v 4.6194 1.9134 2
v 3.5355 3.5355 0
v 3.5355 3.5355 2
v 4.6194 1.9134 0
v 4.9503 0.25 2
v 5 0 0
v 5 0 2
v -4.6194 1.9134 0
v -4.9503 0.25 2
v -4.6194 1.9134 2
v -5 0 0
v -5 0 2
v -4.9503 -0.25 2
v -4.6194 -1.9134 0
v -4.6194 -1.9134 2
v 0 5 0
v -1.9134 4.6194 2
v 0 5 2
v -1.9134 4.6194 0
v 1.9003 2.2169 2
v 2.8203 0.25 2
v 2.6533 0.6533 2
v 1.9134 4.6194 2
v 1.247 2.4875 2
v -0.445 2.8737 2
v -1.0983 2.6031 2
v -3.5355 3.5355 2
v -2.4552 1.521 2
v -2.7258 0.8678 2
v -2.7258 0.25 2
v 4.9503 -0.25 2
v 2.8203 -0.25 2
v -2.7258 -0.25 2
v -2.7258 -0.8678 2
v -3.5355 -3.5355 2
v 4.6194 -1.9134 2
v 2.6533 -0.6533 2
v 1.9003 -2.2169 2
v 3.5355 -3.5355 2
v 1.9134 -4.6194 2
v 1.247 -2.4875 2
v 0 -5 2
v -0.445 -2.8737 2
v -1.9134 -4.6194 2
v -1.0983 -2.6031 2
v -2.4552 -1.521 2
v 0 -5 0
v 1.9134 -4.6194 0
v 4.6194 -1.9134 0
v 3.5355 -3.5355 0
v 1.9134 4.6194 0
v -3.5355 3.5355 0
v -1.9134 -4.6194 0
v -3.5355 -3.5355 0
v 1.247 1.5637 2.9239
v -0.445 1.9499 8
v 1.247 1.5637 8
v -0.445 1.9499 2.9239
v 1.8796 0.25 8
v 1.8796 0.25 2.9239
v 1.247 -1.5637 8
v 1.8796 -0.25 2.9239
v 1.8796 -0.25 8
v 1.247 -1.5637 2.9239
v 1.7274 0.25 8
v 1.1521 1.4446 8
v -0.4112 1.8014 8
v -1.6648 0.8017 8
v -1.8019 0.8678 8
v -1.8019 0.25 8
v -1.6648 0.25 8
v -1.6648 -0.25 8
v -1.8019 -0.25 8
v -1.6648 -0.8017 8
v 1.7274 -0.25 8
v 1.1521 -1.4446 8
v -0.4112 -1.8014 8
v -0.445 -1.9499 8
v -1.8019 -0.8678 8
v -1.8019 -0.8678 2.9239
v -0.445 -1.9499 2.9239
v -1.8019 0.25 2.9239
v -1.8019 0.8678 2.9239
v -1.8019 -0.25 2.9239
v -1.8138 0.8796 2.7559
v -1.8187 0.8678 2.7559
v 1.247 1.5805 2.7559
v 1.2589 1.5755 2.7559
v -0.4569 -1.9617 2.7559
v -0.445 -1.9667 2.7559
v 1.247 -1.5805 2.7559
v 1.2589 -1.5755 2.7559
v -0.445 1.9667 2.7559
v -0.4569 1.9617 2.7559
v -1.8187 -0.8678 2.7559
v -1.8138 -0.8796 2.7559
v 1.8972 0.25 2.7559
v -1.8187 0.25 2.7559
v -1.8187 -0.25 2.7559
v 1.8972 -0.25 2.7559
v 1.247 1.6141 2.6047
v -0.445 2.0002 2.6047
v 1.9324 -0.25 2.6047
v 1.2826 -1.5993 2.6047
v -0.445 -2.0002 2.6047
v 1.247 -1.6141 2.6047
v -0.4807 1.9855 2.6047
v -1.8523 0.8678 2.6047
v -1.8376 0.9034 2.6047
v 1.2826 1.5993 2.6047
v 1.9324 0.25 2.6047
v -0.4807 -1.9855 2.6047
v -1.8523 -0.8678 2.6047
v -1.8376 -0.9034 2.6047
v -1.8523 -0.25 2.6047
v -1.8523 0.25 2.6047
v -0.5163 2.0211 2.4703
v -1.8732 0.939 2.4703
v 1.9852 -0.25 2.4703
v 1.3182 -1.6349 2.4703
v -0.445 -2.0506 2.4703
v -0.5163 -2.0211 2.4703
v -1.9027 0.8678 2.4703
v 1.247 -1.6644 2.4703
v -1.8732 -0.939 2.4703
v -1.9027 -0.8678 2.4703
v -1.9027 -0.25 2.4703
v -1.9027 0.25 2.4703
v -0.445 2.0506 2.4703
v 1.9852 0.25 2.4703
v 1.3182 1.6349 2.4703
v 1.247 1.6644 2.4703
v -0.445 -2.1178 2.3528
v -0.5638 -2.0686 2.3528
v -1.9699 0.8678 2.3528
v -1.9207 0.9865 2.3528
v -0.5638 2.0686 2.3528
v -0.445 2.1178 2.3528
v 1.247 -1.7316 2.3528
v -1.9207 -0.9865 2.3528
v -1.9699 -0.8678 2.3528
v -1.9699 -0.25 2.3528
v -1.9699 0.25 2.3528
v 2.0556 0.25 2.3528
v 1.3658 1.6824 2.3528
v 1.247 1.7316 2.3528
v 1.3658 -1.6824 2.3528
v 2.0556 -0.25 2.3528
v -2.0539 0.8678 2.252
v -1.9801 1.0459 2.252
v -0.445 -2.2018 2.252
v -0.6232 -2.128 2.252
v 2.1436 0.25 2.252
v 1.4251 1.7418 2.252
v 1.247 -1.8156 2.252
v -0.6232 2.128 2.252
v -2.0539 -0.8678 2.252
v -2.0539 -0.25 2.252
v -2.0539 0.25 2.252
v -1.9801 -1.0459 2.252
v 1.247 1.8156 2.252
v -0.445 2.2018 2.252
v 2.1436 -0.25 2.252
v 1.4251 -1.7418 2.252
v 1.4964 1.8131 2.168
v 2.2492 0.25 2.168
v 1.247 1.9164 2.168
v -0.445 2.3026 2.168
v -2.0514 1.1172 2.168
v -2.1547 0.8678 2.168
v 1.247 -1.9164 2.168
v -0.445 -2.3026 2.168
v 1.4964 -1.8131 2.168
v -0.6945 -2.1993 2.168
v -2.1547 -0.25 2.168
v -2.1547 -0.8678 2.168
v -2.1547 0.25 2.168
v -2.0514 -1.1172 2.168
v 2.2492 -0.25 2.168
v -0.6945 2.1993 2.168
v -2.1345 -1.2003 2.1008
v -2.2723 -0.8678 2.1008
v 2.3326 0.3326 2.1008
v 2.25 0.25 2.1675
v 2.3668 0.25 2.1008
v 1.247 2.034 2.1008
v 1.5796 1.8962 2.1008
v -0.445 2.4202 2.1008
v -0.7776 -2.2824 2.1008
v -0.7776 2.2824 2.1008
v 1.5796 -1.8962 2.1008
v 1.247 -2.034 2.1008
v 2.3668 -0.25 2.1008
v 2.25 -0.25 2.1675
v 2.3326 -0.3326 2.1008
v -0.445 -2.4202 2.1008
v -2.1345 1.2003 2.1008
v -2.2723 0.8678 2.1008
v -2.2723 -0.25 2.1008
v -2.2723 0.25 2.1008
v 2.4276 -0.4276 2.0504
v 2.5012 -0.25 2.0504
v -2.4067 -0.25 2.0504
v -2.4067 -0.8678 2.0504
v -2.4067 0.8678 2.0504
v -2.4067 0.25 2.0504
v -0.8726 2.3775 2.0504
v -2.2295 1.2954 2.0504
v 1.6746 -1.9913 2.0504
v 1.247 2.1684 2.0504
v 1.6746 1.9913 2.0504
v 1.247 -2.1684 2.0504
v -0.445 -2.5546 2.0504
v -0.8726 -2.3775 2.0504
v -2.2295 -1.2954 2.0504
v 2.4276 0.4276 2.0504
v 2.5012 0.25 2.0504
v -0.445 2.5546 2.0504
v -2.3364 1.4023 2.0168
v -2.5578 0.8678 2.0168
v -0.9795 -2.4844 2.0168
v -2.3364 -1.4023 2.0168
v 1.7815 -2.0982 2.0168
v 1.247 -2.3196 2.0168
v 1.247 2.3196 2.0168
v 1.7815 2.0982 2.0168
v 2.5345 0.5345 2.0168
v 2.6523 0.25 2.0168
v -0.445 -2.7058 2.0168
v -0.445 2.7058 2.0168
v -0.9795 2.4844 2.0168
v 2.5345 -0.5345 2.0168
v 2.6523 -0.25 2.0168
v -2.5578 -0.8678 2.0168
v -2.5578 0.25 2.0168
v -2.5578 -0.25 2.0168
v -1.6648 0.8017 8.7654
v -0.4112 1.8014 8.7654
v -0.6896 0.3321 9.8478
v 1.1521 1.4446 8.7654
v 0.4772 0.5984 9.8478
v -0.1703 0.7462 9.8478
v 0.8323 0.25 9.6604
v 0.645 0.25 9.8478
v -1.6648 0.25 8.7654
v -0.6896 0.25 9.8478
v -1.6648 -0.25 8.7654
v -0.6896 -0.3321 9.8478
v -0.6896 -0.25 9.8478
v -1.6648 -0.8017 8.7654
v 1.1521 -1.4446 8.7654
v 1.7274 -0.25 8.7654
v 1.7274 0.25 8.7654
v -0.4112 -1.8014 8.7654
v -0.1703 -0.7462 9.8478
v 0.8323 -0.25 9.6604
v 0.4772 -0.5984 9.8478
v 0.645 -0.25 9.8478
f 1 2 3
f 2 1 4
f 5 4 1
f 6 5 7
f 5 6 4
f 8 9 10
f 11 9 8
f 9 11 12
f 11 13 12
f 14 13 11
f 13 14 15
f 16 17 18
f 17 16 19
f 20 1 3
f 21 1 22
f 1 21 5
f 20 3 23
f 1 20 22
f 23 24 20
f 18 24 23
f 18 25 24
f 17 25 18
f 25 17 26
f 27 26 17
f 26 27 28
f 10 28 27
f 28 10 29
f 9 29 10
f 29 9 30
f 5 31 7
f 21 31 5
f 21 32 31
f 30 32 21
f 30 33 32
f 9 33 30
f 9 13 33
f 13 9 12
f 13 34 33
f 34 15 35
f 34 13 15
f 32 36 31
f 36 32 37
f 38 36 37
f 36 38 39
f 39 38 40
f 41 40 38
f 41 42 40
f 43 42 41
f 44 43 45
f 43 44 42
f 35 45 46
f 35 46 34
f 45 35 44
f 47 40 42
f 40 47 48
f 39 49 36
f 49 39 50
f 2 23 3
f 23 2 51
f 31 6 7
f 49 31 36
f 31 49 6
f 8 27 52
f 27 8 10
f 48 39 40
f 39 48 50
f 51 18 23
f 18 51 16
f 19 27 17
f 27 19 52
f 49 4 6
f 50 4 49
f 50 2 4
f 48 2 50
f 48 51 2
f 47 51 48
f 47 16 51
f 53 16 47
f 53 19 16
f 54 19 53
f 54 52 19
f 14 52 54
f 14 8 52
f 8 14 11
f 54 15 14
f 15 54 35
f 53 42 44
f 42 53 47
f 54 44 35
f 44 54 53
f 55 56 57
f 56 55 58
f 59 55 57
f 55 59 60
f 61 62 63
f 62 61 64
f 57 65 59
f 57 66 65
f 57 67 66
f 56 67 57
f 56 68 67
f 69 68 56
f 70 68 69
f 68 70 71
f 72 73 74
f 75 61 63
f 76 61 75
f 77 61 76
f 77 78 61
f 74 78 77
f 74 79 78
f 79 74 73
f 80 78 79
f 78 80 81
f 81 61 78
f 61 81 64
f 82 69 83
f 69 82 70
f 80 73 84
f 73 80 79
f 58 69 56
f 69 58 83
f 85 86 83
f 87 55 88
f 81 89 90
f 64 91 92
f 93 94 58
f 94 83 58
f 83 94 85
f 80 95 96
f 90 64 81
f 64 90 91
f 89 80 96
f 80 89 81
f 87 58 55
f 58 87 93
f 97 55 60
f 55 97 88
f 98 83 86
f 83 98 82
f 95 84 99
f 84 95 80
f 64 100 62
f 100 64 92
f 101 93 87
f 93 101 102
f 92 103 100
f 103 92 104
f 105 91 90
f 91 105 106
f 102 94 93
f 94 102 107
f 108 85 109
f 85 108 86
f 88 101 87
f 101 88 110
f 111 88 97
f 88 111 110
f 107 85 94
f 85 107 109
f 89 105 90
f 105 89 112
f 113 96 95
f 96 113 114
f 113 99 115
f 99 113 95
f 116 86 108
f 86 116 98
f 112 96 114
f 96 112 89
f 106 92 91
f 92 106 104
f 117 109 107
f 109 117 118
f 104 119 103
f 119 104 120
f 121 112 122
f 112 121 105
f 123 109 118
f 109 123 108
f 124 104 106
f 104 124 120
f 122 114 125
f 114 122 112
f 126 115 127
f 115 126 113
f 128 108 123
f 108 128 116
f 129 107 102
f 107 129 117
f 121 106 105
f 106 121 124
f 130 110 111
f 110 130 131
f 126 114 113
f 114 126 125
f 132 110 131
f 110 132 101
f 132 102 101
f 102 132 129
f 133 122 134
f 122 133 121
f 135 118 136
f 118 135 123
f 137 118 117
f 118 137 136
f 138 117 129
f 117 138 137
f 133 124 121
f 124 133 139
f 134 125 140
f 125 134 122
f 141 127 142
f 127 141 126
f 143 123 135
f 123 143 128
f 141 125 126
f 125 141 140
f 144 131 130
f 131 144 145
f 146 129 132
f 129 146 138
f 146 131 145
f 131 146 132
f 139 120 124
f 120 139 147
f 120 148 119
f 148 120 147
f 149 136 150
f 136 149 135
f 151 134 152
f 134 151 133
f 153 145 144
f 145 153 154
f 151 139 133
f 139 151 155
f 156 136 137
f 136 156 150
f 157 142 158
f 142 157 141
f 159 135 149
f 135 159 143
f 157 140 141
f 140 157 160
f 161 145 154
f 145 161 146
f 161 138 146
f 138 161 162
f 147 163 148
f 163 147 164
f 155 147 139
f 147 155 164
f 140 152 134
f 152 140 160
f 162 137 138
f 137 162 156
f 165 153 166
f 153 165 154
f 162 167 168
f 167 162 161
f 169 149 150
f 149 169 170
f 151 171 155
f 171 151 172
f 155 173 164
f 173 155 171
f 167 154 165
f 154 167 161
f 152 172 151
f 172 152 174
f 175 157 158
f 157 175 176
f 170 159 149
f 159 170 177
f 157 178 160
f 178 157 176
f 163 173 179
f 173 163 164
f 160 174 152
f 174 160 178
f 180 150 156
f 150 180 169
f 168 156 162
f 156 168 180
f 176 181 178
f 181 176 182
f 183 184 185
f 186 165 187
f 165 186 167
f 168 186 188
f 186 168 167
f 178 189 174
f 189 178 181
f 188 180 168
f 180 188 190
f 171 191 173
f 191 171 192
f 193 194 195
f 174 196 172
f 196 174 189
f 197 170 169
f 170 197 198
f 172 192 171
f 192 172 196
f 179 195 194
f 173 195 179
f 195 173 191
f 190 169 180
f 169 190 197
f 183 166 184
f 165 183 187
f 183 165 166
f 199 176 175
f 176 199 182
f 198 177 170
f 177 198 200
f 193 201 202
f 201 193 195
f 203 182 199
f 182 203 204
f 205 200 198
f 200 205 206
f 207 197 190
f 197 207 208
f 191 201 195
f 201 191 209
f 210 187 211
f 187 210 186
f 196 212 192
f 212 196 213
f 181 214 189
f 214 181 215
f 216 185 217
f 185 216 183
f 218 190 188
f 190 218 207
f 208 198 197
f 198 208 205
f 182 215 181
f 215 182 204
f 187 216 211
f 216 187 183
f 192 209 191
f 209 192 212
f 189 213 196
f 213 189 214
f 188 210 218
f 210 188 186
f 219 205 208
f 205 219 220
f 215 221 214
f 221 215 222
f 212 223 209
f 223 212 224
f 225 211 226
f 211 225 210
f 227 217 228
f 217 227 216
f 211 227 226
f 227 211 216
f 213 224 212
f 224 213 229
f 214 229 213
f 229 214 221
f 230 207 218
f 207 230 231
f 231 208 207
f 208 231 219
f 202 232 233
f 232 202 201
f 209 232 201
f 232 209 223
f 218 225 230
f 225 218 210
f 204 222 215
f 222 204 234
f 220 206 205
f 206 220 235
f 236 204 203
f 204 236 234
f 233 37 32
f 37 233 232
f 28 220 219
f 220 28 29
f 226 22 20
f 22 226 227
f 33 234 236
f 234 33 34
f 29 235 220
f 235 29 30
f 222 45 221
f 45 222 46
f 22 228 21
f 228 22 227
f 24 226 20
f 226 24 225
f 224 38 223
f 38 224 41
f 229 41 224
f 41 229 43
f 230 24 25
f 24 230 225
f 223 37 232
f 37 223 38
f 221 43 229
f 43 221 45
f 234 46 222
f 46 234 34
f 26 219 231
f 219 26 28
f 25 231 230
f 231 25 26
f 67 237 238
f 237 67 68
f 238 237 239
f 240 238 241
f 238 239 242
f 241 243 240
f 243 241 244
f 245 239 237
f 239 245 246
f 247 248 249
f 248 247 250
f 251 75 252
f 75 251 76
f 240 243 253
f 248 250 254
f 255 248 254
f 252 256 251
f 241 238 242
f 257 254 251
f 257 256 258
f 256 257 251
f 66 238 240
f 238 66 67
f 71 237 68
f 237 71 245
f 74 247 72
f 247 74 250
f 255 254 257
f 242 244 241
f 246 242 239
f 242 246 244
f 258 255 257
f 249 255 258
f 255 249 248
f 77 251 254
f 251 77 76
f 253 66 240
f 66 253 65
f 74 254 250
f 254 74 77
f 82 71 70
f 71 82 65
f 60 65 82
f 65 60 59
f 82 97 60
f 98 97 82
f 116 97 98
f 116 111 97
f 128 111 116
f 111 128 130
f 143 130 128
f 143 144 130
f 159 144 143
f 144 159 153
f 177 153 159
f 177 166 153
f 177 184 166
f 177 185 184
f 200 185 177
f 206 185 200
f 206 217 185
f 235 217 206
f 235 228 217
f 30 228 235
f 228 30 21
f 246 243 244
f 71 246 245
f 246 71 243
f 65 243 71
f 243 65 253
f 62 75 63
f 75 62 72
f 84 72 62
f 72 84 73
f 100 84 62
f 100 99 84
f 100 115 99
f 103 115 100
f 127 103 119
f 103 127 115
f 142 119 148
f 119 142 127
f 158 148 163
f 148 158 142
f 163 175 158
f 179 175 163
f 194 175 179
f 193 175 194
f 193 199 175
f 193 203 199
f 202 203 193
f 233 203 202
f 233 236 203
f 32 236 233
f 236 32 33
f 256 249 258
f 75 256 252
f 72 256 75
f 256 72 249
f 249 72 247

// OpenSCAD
// Copyright 2020 Martin Scheidt (Attribution 4.0 International, CC-BY 4.0)
//
// You are free to copy and redistribute the material in any medium or format.
// You are free to remix, transform, and build upon the material for any purpose, even commercially.
// You must give appropriate credit, provide a link to the license, and indicate if changes were made.
// You may not apply legal terms or technological measures that legally restrict others from doing anything the license permits.
// No warranties are given.

// Fillet function (c) Andrew Plumb aka clothbot
//https://github.com/clothbot/ClothBotCreations/blob/master/utilities/fillet.scad

module fillet(r=1.0,steps=3,include=true) {
  if(include) for (k=[0:$children-1]) {
	children(k);
  }
  for (i=[0:$children-2] ) {
    for(j=[i+1:$children-1] ) {
	fillet_two(r=r,steps=steps) {
	  children(i);
	  children(j);
	  intersection() {
		children(i);
		children(j);
	  }
	}
    }
  }
}

module fillet_two(r=1.0,steps=3) {
  for(step=[1:steps]) {
	hull() {
	  render() intersection() {
		children(0);
		offset_3d(r=r*step/steps) children(2);
	  }
	  render() intersection() {
		children(1);
		offset_3d(r=r*(steps-step+1)/steps) children(2);
	  }
	}
  }
}

module offset_3d(r=1.0) {
  for(k=[0:$children-1]) minkowski() {
	children(k);
	sphere(r=r,$fn=8);
  }
}

// End Fillet function

fissure = 0.5;
pin_length = 10;
pin_width = 4;

difference(){
    union(){
        fillet(r=pin_width/4,steps=10) {
            cylinder(h = pin_width/2, d = pin_length);
            cylinder(h = 8, d = pin_width);
        }
        translate([0,0,8]) sphere(d = pin_width);
    }
    translate([-pin_length/2,-fissure/2,pin_width/2]) cube([pin_length,fissure,pin_length]);
}
